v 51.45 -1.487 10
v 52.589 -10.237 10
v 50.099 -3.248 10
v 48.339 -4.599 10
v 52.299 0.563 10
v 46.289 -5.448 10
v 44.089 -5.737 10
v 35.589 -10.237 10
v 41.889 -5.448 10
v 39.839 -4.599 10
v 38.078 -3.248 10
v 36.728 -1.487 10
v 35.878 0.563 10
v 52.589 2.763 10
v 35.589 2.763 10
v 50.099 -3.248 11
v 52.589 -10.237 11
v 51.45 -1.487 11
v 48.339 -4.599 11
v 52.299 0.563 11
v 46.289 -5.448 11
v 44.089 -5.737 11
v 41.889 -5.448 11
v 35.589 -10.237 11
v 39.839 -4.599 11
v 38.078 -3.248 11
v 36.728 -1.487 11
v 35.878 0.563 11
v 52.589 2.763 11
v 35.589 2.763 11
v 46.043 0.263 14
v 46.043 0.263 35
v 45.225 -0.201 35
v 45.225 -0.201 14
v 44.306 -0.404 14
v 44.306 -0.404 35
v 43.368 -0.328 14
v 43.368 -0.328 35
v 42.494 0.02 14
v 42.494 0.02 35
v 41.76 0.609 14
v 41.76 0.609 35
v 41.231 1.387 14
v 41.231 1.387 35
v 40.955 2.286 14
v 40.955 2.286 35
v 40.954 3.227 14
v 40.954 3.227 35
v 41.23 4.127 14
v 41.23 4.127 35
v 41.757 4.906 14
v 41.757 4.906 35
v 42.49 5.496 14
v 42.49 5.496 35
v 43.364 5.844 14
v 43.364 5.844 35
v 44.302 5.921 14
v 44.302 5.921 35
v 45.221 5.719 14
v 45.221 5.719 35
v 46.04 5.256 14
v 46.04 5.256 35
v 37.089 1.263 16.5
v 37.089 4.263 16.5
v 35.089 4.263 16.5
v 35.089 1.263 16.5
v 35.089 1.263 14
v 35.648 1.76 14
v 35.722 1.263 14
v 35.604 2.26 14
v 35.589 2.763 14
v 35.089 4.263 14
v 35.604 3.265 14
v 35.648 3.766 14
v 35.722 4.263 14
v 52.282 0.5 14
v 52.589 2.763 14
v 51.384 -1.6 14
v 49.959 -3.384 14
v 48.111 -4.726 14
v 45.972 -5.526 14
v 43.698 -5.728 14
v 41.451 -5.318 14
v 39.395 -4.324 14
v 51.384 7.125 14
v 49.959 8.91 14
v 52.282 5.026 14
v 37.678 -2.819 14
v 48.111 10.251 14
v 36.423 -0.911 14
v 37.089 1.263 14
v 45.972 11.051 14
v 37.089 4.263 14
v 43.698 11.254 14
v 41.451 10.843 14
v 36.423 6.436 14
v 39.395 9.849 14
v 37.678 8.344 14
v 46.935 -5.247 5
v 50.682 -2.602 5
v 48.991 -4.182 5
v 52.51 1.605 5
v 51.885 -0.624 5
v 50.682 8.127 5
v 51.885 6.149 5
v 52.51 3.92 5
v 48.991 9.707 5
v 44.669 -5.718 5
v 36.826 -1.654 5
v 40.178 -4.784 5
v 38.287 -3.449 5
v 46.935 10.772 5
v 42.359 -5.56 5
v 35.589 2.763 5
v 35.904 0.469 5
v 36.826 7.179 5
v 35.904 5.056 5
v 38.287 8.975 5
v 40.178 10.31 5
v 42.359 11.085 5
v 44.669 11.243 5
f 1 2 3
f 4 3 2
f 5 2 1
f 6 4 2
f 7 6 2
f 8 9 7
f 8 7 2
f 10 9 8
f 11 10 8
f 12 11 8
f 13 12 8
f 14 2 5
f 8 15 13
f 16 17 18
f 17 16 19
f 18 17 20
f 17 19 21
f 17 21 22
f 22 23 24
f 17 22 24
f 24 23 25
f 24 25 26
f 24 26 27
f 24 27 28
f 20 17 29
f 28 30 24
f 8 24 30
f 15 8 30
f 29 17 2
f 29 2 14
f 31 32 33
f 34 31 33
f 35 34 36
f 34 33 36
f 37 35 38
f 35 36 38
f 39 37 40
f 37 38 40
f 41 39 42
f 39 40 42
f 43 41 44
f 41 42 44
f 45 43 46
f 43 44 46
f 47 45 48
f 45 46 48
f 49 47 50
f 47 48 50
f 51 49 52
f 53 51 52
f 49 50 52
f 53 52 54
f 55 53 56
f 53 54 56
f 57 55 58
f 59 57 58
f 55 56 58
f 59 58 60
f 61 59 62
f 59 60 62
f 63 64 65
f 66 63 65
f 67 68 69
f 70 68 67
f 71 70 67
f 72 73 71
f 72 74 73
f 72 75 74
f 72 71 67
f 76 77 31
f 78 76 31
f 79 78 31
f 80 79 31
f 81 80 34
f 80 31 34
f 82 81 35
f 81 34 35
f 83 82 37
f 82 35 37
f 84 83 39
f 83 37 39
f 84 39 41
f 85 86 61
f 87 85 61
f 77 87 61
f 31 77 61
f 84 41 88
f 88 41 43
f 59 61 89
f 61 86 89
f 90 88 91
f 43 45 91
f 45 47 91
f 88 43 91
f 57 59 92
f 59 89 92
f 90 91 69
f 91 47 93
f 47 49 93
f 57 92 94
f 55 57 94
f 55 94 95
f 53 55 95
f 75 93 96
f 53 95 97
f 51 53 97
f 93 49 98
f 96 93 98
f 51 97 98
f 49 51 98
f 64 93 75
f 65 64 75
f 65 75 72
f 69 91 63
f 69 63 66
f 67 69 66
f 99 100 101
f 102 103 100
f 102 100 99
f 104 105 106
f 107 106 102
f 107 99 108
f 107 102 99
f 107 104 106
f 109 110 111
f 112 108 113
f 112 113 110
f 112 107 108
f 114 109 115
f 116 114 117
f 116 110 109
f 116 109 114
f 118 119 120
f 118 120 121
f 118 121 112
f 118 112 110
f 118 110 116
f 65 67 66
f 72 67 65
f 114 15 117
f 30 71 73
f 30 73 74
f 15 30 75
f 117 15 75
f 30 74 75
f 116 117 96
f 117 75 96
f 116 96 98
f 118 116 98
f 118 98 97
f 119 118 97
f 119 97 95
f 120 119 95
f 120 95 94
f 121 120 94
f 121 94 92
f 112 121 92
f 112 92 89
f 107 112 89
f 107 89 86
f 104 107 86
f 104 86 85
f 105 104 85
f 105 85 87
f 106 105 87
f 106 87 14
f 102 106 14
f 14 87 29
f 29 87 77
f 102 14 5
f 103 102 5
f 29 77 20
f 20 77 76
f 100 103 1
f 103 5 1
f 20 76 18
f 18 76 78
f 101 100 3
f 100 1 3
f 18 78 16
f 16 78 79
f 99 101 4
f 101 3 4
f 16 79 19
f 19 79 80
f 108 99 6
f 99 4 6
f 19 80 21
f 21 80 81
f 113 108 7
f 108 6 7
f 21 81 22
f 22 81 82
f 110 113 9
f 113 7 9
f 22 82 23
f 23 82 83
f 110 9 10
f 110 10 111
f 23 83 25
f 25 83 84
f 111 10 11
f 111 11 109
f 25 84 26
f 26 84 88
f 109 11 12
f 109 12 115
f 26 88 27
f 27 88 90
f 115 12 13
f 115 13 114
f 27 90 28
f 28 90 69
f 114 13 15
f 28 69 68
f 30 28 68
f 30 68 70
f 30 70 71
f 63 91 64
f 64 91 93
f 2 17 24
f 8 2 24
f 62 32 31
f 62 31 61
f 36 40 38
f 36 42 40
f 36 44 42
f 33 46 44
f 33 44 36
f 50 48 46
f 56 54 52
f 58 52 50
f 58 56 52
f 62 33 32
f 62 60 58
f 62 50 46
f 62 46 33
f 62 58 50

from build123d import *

# Parameters (mm, degrees)
SKETCH067_R               = 8.5
PAD009_DEPTH              = 9
SKETCH068_W               = 17
SKETCH068_H               = 13
PAD010_DEPTH              = 1
SKETCH069_W               = 2
SKETCH069_H               = 3
PAD011_DEPTH              = 2.5
PAD012_DEPTH              = 21
FUSION002_PLACEMENT_ANGLE = 180


with BuildPart() as body009:
    # Sketch067 → Pad009 (new body)
    with BuildSketch(Plane.XY):
        with Locations((43.911242, 2.762661)):
            Circle(SKETCH067_R)
    extrude(amount=PAD009_DEPTH)

    # Sketch068 → Pad010 (join)
    with BuildSketch(Plane.XY.offset(3)):
        with Locations((43.911242, -3.737339)):
            Rectangle(SKETCH068_W, SKETCH068_H)
    extrude(amount=PAD010_DEPTH)

    # Sketch069 → Pad011 (join)
    with BuildSketch(Plane.XY):
        with Locations((51.911242, 2.762661)):
            Rectangle(SKETCH069_W, SKETCH069_H)
    extrude(amount=-PAD011_DEPTH)


with BuildPart() as pot:
    # Sketch070 → Pad012 (new body)
    with BuildSketch(Plane.XY):
        with BuildLine():
            Line((41.956765, 0.26313), (41.959666, 5.256243))
            ThreePointArc((41.956765, 0.26313), (47.080742, 2.75671), (41.959666, 5.256243))
        make_face()
    extrude(amount=PAD012_DEPTH)


with BuildPart() as pot_1:
    # Body010 placement: moved
    add(pot.part.moved(Location((0, 0, -21))))

    # Fusion002: union Body009
    add(body009.part)


with BuildPart() as pot_2:
    # Fusion002 placement: moved
    add(pot_1.part.moved(Location((88, 0, 14))).rotate(Axis((88, 0, 14), (0, 1, 0)), FUSION002_PLACEMENT_ANGLE))


solid = pot_2.part
